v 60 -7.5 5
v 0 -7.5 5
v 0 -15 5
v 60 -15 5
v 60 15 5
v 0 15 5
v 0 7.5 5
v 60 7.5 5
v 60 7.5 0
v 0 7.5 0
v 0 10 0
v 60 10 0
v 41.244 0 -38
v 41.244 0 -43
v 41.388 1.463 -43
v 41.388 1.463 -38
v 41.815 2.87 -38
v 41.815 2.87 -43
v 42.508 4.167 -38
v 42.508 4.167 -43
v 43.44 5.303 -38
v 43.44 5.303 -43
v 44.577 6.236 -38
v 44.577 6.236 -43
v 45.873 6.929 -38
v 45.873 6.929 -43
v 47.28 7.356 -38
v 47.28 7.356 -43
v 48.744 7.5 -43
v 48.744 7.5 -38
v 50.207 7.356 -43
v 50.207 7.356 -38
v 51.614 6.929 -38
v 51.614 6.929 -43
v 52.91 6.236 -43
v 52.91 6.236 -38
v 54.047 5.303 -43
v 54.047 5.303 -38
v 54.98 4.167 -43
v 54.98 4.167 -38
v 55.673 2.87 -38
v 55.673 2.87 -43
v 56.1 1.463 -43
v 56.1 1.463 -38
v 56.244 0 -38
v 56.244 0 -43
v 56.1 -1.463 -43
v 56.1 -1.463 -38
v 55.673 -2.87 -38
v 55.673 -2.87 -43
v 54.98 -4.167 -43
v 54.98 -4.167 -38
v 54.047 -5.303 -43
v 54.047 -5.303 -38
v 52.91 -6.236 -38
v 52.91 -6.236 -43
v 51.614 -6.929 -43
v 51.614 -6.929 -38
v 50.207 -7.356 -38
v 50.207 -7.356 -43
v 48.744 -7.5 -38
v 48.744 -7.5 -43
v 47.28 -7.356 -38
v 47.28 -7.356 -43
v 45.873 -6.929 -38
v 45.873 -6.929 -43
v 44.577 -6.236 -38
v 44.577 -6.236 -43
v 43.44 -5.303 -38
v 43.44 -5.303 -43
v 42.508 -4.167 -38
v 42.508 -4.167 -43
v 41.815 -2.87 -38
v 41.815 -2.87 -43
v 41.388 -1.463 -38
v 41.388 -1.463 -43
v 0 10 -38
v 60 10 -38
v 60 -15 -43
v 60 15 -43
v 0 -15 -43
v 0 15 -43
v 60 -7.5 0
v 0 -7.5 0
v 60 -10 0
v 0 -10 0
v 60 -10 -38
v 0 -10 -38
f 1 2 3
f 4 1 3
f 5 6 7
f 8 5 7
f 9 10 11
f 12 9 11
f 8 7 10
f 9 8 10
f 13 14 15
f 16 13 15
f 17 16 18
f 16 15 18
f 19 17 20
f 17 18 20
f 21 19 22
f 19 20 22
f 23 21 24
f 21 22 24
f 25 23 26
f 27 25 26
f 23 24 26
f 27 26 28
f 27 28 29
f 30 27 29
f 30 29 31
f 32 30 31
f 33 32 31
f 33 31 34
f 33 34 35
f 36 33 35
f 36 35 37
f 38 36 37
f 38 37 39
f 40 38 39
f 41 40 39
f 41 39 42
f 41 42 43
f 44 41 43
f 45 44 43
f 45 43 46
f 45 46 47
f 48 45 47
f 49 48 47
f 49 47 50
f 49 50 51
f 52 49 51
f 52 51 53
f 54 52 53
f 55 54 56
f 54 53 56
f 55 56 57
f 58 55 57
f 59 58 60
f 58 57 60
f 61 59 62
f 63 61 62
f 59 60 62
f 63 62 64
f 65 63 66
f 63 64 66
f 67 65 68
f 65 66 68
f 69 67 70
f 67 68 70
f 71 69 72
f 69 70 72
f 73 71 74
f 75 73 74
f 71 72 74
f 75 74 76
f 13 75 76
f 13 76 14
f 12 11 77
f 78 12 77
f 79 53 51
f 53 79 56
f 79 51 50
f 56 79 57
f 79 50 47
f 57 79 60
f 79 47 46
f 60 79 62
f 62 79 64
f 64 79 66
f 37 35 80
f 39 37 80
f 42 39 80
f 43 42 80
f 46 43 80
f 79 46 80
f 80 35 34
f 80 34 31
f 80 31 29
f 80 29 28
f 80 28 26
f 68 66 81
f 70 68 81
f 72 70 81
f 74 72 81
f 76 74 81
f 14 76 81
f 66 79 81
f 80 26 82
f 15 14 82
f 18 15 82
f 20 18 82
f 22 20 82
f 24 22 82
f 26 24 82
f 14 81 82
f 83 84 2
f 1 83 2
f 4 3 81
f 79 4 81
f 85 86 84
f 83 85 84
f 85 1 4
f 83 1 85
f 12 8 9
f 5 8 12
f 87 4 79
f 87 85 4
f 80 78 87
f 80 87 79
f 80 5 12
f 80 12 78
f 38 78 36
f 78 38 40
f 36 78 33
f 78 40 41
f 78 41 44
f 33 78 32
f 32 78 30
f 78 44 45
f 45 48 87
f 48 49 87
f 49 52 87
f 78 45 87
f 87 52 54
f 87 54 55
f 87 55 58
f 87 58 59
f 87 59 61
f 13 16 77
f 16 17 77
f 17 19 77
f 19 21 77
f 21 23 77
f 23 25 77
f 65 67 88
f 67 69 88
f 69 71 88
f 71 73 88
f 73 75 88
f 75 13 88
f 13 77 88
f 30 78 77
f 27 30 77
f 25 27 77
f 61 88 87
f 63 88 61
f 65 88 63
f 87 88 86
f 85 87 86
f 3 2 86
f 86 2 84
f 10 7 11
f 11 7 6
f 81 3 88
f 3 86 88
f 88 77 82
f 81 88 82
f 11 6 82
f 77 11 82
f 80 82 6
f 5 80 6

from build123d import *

# Parameters (mm, degrees)
BOSS_EXTRUDE1_DEPTH = 60
SKETCH3_R           = 7.5
CUT_EXTRUDE1_DEPTH  = 49


with BuildPart() as part:
    # Sketch1 → Boss-Extrude1 (new body)
    with BuildSketch(Plane(origin=(0, 0, 0), x_dir=(0, 0, -1), z_dir=(1, 0, 0))):
        Polygon((-5, 7.5), (0, 7.5), (0, 10), (38, 10), (38, 0), (43, 0), (43, 15), (-5, 15), align=None)
        Polygon((43, 0), (38, 0), (38, -10), (0, -10), (0, -7.5), (-5, -7.5), (-5, -15), (43, -15), align=None)
    extrude(amount=BOSS_EXTRUDE1_DEPTH)

    # Sketch3 → Cut-Extrude1 (cut, through all)
    with BuildSketch(Plane(origin=(0, 0, -43), x_dir=(-1, 0, 0), z_dir=(0, 0, -1))):
        with Locations((-48.743612904, 0)):
            Circle(SKETCH3_R)
    extrude(amount=-CUT_EXTRUDE1_DEPTH, mode=Mode.SUBTRACT)


solid = part.part
